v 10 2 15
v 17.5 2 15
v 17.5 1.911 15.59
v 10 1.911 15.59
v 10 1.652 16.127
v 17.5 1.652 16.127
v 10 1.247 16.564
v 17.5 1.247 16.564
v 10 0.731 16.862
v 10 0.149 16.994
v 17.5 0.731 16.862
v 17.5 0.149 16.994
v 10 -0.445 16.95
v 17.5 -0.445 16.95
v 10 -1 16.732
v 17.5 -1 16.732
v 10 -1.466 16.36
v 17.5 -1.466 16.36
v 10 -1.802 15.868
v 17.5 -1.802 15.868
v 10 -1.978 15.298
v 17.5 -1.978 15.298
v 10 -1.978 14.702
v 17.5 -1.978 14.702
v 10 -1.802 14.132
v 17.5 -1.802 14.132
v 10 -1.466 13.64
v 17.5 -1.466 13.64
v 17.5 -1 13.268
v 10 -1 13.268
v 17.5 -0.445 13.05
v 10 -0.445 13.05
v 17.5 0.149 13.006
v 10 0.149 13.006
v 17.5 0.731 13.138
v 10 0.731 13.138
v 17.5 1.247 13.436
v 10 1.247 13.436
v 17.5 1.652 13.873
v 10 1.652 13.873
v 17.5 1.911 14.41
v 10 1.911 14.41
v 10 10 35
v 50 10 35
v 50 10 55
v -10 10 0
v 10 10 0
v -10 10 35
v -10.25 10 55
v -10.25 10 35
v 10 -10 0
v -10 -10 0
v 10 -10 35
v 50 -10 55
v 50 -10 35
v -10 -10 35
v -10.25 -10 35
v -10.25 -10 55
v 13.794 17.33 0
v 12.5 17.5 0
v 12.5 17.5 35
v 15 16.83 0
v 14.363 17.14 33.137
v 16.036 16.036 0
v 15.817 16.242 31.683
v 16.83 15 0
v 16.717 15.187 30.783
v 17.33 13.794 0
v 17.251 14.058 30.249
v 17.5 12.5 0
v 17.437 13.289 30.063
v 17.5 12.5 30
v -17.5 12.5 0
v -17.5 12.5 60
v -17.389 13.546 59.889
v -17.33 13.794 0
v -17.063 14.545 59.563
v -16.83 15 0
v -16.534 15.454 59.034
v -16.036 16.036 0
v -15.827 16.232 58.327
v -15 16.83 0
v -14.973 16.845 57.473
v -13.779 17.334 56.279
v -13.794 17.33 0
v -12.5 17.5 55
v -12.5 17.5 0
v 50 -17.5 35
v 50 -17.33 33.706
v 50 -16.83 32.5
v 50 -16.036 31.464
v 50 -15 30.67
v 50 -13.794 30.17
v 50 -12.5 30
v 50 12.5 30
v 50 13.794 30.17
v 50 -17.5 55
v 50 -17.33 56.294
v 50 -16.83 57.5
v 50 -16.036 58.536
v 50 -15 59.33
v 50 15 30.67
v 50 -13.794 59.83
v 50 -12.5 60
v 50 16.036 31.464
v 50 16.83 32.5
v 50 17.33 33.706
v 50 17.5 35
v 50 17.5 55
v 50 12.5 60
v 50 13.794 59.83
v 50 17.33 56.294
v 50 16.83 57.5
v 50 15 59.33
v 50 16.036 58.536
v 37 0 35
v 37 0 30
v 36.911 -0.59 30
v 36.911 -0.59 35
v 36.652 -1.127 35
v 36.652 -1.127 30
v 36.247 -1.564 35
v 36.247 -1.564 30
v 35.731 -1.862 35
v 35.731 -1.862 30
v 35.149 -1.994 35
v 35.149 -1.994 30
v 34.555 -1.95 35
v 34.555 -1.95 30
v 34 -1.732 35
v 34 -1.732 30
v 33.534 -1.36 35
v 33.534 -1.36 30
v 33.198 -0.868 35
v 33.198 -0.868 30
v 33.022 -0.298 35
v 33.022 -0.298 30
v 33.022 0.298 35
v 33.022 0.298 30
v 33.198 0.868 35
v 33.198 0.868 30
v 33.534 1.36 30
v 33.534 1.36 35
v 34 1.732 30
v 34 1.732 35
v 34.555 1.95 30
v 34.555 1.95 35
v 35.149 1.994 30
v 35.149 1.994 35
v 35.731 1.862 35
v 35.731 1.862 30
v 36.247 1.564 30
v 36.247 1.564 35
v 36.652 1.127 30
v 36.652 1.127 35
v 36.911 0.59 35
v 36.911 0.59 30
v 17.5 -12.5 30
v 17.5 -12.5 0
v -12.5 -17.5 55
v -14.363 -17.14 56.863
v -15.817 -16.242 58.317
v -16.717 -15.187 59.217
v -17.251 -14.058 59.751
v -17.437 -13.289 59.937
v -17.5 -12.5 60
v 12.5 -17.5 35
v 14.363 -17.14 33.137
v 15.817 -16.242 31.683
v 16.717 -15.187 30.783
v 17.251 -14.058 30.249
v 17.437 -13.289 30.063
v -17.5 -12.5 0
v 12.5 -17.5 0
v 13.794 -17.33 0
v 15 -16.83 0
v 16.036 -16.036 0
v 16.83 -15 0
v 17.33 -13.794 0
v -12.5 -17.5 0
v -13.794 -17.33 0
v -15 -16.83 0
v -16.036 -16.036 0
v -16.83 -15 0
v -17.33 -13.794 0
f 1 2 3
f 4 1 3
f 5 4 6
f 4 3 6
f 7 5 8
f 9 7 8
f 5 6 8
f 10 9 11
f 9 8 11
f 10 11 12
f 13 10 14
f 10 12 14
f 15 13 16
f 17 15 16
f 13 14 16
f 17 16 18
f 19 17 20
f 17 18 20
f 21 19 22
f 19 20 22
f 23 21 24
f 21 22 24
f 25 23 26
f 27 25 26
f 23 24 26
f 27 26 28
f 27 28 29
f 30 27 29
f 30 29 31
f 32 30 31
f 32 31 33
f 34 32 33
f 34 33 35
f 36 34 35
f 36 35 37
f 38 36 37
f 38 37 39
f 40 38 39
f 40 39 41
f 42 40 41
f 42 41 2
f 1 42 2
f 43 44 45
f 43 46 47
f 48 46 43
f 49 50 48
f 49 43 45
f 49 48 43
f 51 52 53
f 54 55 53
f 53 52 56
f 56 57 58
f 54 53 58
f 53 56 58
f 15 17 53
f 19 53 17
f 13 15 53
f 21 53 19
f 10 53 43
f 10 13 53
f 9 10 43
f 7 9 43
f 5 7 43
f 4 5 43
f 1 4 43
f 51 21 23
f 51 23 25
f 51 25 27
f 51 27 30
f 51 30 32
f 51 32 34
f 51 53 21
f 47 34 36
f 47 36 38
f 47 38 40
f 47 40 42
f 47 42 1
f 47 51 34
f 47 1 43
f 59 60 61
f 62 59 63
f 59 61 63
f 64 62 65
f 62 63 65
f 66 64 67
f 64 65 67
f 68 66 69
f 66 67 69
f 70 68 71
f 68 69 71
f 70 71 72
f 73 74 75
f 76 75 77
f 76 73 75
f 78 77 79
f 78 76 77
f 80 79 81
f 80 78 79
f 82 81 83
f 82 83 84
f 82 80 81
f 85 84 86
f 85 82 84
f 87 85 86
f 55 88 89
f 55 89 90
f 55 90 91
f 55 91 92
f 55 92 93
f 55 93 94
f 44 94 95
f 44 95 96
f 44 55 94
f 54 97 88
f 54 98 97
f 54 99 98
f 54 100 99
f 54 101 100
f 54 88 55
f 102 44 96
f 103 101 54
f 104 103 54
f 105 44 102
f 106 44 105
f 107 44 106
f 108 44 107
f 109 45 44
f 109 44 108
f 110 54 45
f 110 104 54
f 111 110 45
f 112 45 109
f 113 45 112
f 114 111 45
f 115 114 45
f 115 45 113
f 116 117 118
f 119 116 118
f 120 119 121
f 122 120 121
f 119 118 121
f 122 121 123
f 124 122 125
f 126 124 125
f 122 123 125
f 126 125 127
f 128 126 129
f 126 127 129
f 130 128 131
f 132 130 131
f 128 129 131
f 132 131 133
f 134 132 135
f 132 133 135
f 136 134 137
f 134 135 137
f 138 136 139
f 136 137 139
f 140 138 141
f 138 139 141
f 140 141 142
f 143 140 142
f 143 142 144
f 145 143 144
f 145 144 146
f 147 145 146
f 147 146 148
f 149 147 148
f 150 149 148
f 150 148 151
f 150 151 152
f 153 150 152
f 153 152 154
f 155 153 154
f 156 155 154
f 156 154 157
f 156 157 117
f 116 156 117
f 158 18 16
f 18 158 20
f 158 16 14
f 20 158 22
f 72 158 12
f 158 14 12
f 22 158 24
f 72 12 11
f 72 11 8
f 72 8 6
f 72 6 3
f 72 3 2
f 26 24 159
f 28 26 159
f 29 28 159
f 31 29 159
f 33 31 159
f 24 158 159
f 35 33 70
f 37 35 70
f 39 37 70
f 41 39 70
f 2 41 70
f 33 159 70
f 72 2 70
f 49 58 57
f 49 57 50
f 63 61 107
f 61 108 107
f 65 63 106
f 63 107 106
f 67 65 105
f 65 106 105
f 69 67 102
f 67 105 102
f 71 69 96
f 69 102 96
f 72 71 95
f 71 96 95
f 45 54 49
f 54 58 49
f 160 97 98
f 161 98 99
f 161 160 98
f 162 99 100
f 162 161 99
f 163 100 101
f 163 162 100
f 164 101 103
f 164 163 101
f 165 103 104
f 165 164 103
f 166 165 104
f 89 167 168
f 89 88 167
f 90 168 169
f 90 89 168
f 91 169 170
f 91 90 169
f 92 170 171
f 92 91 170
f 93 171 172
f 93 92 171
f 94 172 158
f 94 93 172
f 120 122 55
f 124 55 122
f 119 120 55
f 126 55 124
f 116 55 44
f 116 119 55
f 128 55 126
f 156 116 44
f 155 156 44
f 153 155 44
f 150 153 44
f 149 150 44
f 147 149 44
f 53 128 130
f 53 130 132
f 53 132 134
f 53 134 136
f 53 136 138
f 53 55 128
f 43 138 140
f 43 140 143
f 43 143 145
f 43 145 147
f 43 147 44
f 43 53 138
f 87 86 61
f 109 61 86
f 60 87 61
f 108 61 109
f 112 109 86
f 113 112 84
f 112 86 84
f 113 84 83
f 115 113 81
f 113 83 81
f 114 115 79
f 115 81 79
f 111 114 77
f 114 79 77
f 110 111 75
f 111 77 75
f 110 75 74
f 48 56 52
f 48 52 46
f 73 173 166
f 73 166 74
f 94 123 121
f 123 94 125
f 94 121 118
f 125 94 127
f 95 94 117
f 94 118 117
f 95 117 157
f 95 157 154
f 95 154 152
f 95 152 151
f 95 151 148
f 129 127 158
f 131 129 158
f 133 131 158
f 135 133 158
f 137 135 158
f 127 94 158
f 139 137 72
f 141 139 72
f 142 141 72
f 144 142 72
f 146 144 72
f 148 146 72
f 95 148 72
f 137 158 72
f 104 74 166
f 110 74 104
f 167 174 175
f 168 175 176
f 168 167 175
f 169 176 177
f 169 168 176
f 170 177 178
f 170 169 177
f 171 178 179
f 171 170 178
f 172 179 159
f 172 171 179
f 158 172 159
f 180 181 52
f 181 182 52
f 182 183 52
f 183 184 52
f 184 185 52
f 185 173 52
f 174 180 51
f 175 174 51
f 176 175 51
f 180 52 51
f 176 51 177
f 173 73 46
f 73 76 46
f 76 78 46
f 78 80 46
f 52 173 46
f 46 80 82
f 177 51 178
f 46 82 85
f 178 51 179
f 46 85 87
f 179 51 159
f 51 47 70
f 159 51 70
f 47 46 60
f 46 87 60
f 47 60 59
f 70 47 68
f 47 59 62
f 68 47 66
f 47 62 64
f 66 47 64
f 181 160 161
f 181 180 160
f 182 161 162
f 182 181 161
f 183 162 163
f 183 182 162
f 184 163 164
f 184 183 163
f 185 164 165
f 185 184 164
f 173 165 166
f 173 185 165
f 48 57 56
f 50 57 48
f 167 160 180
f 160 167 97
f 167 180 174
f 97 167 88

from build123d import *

# Parameters (mm, degrees)
F0_W      = 35
F0_H      = 35
F0_W_2    = 20
F0_H_2    = 20
F1_DEPTH  = 60
F3_R      = 2
F4_DEPTH  = 10
F6_W      = 35
F6_H      = 30
F6_W_2    = 20
F6_H_2    = 20
F7_DEPTH  = 50
F8_DEPTH  = 17.5
F9_DEPTH  = 60
F10_DEPTH = 10.25
F11_DEPTH = 55
F12_R     = 5
F13_R     = 2
F14_DEPTH = 20


# Not quite as in the source:
# - a feature of the source that left no trace in its solid (it failed there, or was rolled back) is left out


with BuildPart() as f1:
    # F0 (on Top) → F1 (new body)
    with BuildSketch(Plane.XY):
        Rectangle(F0_W, F0_H)
        Rectangle(F0_W_2, F0_H_2, mode=Mode.SUBTRACT)
    extrude(amount=F1_DEPTH)

    # F3 (on face) → F4 (cut)
    with BuildSketch(Plane.YZ.offset(17.5)):
        with Locations((0, 40)):
            Circle(F3_R)
        with Locations((0, 15)):
            Circle(F3_R)
    extrude(amount=-F4_DEPTH, mode=Mode.SUBTRACT)

    # F6 (on Right) → F7 (join)
    with BuildSketch(Plane.YZ):
        with Locations((0, 45)):
            Rectangle(F6_W, F6_H)
        with Locations((0, 45)):
            Rectangle(F6_W_2, F6_H_2, mode=Mode.SUBTRACT)
        with Locations((0, 45)):
            Rectangle(F6_W_2, F6_H_2)
    extrude(amount=F7_DEPTH)

    # F6 (on Right) → F8 (join, through all)
    with BuildSketch(Plane.YZ):
        with Locations((0, 45)):
            Rectangle(F6_W, F6_H)
        with Locations((0, 45)):
            Rectangle(F6_W_2, F6_H_2, mode=Mode.SUBTRACT)
        with Locations((0, 45)):
            Rectangle(F6_W_2, F6_H_2)
    extrude(amount=-F8_DEPTH)

    # F6 (on Right) → F9 (cut)
    with BuildSketch(Plane.YZ):
        with Locations((0, 45)):
            Rectangle(F6_W_2, F6_H_2)
    extrude(amount=F9_DEPTH, mode=Mode.SUBTRACT)

    # F6 (on Right) → F10 (cut)
    with BuildSketch(Plane.YZ):
        with Locations((0, 45)):
            Rectangle(F6_W_2, F6_H_2)
    extrude(amount=-F10_DEPTH, mode=Mode.SUBTRACT)

    # F0 (on Top) → F11 (cut, through all)
    with BuildSketch(Plane.XY):
        Rectangle(F0_W_2, F0_H_2)
    extrude(amount=F11_DEPTH, mode=Mode.SUBTRACT)

    # F12
    f12_edges = [f1.edges().sort_by_distance(p)[0] for p in [
        (-17.5, -17.5, 30),
        (-17.5, 17.5, 30),
        (33.75, -17.5, 30),
        (33.75, 17.5, 30),
        (16.25, 17.5, 60),
        (16.25, -17.5, 60),
        (17.5, -17.5, 15),
        (17.5, 17.5, 15),
    ]]
    fillet(f12_edges, radius=F12_R)

    # F13 (on face) → F14 (cut)
    with BuildSketch(Plane(origin=(0, 0, 30), x_dir=(1, 0, 0), z_dir=(0, 0, -1))):
        with Locations((35, 0)):
            Circle(F13_R)
    extrude(amount=-F14_DEPTH, mode=Mode.SUBTRACT)


solid = f1.part
